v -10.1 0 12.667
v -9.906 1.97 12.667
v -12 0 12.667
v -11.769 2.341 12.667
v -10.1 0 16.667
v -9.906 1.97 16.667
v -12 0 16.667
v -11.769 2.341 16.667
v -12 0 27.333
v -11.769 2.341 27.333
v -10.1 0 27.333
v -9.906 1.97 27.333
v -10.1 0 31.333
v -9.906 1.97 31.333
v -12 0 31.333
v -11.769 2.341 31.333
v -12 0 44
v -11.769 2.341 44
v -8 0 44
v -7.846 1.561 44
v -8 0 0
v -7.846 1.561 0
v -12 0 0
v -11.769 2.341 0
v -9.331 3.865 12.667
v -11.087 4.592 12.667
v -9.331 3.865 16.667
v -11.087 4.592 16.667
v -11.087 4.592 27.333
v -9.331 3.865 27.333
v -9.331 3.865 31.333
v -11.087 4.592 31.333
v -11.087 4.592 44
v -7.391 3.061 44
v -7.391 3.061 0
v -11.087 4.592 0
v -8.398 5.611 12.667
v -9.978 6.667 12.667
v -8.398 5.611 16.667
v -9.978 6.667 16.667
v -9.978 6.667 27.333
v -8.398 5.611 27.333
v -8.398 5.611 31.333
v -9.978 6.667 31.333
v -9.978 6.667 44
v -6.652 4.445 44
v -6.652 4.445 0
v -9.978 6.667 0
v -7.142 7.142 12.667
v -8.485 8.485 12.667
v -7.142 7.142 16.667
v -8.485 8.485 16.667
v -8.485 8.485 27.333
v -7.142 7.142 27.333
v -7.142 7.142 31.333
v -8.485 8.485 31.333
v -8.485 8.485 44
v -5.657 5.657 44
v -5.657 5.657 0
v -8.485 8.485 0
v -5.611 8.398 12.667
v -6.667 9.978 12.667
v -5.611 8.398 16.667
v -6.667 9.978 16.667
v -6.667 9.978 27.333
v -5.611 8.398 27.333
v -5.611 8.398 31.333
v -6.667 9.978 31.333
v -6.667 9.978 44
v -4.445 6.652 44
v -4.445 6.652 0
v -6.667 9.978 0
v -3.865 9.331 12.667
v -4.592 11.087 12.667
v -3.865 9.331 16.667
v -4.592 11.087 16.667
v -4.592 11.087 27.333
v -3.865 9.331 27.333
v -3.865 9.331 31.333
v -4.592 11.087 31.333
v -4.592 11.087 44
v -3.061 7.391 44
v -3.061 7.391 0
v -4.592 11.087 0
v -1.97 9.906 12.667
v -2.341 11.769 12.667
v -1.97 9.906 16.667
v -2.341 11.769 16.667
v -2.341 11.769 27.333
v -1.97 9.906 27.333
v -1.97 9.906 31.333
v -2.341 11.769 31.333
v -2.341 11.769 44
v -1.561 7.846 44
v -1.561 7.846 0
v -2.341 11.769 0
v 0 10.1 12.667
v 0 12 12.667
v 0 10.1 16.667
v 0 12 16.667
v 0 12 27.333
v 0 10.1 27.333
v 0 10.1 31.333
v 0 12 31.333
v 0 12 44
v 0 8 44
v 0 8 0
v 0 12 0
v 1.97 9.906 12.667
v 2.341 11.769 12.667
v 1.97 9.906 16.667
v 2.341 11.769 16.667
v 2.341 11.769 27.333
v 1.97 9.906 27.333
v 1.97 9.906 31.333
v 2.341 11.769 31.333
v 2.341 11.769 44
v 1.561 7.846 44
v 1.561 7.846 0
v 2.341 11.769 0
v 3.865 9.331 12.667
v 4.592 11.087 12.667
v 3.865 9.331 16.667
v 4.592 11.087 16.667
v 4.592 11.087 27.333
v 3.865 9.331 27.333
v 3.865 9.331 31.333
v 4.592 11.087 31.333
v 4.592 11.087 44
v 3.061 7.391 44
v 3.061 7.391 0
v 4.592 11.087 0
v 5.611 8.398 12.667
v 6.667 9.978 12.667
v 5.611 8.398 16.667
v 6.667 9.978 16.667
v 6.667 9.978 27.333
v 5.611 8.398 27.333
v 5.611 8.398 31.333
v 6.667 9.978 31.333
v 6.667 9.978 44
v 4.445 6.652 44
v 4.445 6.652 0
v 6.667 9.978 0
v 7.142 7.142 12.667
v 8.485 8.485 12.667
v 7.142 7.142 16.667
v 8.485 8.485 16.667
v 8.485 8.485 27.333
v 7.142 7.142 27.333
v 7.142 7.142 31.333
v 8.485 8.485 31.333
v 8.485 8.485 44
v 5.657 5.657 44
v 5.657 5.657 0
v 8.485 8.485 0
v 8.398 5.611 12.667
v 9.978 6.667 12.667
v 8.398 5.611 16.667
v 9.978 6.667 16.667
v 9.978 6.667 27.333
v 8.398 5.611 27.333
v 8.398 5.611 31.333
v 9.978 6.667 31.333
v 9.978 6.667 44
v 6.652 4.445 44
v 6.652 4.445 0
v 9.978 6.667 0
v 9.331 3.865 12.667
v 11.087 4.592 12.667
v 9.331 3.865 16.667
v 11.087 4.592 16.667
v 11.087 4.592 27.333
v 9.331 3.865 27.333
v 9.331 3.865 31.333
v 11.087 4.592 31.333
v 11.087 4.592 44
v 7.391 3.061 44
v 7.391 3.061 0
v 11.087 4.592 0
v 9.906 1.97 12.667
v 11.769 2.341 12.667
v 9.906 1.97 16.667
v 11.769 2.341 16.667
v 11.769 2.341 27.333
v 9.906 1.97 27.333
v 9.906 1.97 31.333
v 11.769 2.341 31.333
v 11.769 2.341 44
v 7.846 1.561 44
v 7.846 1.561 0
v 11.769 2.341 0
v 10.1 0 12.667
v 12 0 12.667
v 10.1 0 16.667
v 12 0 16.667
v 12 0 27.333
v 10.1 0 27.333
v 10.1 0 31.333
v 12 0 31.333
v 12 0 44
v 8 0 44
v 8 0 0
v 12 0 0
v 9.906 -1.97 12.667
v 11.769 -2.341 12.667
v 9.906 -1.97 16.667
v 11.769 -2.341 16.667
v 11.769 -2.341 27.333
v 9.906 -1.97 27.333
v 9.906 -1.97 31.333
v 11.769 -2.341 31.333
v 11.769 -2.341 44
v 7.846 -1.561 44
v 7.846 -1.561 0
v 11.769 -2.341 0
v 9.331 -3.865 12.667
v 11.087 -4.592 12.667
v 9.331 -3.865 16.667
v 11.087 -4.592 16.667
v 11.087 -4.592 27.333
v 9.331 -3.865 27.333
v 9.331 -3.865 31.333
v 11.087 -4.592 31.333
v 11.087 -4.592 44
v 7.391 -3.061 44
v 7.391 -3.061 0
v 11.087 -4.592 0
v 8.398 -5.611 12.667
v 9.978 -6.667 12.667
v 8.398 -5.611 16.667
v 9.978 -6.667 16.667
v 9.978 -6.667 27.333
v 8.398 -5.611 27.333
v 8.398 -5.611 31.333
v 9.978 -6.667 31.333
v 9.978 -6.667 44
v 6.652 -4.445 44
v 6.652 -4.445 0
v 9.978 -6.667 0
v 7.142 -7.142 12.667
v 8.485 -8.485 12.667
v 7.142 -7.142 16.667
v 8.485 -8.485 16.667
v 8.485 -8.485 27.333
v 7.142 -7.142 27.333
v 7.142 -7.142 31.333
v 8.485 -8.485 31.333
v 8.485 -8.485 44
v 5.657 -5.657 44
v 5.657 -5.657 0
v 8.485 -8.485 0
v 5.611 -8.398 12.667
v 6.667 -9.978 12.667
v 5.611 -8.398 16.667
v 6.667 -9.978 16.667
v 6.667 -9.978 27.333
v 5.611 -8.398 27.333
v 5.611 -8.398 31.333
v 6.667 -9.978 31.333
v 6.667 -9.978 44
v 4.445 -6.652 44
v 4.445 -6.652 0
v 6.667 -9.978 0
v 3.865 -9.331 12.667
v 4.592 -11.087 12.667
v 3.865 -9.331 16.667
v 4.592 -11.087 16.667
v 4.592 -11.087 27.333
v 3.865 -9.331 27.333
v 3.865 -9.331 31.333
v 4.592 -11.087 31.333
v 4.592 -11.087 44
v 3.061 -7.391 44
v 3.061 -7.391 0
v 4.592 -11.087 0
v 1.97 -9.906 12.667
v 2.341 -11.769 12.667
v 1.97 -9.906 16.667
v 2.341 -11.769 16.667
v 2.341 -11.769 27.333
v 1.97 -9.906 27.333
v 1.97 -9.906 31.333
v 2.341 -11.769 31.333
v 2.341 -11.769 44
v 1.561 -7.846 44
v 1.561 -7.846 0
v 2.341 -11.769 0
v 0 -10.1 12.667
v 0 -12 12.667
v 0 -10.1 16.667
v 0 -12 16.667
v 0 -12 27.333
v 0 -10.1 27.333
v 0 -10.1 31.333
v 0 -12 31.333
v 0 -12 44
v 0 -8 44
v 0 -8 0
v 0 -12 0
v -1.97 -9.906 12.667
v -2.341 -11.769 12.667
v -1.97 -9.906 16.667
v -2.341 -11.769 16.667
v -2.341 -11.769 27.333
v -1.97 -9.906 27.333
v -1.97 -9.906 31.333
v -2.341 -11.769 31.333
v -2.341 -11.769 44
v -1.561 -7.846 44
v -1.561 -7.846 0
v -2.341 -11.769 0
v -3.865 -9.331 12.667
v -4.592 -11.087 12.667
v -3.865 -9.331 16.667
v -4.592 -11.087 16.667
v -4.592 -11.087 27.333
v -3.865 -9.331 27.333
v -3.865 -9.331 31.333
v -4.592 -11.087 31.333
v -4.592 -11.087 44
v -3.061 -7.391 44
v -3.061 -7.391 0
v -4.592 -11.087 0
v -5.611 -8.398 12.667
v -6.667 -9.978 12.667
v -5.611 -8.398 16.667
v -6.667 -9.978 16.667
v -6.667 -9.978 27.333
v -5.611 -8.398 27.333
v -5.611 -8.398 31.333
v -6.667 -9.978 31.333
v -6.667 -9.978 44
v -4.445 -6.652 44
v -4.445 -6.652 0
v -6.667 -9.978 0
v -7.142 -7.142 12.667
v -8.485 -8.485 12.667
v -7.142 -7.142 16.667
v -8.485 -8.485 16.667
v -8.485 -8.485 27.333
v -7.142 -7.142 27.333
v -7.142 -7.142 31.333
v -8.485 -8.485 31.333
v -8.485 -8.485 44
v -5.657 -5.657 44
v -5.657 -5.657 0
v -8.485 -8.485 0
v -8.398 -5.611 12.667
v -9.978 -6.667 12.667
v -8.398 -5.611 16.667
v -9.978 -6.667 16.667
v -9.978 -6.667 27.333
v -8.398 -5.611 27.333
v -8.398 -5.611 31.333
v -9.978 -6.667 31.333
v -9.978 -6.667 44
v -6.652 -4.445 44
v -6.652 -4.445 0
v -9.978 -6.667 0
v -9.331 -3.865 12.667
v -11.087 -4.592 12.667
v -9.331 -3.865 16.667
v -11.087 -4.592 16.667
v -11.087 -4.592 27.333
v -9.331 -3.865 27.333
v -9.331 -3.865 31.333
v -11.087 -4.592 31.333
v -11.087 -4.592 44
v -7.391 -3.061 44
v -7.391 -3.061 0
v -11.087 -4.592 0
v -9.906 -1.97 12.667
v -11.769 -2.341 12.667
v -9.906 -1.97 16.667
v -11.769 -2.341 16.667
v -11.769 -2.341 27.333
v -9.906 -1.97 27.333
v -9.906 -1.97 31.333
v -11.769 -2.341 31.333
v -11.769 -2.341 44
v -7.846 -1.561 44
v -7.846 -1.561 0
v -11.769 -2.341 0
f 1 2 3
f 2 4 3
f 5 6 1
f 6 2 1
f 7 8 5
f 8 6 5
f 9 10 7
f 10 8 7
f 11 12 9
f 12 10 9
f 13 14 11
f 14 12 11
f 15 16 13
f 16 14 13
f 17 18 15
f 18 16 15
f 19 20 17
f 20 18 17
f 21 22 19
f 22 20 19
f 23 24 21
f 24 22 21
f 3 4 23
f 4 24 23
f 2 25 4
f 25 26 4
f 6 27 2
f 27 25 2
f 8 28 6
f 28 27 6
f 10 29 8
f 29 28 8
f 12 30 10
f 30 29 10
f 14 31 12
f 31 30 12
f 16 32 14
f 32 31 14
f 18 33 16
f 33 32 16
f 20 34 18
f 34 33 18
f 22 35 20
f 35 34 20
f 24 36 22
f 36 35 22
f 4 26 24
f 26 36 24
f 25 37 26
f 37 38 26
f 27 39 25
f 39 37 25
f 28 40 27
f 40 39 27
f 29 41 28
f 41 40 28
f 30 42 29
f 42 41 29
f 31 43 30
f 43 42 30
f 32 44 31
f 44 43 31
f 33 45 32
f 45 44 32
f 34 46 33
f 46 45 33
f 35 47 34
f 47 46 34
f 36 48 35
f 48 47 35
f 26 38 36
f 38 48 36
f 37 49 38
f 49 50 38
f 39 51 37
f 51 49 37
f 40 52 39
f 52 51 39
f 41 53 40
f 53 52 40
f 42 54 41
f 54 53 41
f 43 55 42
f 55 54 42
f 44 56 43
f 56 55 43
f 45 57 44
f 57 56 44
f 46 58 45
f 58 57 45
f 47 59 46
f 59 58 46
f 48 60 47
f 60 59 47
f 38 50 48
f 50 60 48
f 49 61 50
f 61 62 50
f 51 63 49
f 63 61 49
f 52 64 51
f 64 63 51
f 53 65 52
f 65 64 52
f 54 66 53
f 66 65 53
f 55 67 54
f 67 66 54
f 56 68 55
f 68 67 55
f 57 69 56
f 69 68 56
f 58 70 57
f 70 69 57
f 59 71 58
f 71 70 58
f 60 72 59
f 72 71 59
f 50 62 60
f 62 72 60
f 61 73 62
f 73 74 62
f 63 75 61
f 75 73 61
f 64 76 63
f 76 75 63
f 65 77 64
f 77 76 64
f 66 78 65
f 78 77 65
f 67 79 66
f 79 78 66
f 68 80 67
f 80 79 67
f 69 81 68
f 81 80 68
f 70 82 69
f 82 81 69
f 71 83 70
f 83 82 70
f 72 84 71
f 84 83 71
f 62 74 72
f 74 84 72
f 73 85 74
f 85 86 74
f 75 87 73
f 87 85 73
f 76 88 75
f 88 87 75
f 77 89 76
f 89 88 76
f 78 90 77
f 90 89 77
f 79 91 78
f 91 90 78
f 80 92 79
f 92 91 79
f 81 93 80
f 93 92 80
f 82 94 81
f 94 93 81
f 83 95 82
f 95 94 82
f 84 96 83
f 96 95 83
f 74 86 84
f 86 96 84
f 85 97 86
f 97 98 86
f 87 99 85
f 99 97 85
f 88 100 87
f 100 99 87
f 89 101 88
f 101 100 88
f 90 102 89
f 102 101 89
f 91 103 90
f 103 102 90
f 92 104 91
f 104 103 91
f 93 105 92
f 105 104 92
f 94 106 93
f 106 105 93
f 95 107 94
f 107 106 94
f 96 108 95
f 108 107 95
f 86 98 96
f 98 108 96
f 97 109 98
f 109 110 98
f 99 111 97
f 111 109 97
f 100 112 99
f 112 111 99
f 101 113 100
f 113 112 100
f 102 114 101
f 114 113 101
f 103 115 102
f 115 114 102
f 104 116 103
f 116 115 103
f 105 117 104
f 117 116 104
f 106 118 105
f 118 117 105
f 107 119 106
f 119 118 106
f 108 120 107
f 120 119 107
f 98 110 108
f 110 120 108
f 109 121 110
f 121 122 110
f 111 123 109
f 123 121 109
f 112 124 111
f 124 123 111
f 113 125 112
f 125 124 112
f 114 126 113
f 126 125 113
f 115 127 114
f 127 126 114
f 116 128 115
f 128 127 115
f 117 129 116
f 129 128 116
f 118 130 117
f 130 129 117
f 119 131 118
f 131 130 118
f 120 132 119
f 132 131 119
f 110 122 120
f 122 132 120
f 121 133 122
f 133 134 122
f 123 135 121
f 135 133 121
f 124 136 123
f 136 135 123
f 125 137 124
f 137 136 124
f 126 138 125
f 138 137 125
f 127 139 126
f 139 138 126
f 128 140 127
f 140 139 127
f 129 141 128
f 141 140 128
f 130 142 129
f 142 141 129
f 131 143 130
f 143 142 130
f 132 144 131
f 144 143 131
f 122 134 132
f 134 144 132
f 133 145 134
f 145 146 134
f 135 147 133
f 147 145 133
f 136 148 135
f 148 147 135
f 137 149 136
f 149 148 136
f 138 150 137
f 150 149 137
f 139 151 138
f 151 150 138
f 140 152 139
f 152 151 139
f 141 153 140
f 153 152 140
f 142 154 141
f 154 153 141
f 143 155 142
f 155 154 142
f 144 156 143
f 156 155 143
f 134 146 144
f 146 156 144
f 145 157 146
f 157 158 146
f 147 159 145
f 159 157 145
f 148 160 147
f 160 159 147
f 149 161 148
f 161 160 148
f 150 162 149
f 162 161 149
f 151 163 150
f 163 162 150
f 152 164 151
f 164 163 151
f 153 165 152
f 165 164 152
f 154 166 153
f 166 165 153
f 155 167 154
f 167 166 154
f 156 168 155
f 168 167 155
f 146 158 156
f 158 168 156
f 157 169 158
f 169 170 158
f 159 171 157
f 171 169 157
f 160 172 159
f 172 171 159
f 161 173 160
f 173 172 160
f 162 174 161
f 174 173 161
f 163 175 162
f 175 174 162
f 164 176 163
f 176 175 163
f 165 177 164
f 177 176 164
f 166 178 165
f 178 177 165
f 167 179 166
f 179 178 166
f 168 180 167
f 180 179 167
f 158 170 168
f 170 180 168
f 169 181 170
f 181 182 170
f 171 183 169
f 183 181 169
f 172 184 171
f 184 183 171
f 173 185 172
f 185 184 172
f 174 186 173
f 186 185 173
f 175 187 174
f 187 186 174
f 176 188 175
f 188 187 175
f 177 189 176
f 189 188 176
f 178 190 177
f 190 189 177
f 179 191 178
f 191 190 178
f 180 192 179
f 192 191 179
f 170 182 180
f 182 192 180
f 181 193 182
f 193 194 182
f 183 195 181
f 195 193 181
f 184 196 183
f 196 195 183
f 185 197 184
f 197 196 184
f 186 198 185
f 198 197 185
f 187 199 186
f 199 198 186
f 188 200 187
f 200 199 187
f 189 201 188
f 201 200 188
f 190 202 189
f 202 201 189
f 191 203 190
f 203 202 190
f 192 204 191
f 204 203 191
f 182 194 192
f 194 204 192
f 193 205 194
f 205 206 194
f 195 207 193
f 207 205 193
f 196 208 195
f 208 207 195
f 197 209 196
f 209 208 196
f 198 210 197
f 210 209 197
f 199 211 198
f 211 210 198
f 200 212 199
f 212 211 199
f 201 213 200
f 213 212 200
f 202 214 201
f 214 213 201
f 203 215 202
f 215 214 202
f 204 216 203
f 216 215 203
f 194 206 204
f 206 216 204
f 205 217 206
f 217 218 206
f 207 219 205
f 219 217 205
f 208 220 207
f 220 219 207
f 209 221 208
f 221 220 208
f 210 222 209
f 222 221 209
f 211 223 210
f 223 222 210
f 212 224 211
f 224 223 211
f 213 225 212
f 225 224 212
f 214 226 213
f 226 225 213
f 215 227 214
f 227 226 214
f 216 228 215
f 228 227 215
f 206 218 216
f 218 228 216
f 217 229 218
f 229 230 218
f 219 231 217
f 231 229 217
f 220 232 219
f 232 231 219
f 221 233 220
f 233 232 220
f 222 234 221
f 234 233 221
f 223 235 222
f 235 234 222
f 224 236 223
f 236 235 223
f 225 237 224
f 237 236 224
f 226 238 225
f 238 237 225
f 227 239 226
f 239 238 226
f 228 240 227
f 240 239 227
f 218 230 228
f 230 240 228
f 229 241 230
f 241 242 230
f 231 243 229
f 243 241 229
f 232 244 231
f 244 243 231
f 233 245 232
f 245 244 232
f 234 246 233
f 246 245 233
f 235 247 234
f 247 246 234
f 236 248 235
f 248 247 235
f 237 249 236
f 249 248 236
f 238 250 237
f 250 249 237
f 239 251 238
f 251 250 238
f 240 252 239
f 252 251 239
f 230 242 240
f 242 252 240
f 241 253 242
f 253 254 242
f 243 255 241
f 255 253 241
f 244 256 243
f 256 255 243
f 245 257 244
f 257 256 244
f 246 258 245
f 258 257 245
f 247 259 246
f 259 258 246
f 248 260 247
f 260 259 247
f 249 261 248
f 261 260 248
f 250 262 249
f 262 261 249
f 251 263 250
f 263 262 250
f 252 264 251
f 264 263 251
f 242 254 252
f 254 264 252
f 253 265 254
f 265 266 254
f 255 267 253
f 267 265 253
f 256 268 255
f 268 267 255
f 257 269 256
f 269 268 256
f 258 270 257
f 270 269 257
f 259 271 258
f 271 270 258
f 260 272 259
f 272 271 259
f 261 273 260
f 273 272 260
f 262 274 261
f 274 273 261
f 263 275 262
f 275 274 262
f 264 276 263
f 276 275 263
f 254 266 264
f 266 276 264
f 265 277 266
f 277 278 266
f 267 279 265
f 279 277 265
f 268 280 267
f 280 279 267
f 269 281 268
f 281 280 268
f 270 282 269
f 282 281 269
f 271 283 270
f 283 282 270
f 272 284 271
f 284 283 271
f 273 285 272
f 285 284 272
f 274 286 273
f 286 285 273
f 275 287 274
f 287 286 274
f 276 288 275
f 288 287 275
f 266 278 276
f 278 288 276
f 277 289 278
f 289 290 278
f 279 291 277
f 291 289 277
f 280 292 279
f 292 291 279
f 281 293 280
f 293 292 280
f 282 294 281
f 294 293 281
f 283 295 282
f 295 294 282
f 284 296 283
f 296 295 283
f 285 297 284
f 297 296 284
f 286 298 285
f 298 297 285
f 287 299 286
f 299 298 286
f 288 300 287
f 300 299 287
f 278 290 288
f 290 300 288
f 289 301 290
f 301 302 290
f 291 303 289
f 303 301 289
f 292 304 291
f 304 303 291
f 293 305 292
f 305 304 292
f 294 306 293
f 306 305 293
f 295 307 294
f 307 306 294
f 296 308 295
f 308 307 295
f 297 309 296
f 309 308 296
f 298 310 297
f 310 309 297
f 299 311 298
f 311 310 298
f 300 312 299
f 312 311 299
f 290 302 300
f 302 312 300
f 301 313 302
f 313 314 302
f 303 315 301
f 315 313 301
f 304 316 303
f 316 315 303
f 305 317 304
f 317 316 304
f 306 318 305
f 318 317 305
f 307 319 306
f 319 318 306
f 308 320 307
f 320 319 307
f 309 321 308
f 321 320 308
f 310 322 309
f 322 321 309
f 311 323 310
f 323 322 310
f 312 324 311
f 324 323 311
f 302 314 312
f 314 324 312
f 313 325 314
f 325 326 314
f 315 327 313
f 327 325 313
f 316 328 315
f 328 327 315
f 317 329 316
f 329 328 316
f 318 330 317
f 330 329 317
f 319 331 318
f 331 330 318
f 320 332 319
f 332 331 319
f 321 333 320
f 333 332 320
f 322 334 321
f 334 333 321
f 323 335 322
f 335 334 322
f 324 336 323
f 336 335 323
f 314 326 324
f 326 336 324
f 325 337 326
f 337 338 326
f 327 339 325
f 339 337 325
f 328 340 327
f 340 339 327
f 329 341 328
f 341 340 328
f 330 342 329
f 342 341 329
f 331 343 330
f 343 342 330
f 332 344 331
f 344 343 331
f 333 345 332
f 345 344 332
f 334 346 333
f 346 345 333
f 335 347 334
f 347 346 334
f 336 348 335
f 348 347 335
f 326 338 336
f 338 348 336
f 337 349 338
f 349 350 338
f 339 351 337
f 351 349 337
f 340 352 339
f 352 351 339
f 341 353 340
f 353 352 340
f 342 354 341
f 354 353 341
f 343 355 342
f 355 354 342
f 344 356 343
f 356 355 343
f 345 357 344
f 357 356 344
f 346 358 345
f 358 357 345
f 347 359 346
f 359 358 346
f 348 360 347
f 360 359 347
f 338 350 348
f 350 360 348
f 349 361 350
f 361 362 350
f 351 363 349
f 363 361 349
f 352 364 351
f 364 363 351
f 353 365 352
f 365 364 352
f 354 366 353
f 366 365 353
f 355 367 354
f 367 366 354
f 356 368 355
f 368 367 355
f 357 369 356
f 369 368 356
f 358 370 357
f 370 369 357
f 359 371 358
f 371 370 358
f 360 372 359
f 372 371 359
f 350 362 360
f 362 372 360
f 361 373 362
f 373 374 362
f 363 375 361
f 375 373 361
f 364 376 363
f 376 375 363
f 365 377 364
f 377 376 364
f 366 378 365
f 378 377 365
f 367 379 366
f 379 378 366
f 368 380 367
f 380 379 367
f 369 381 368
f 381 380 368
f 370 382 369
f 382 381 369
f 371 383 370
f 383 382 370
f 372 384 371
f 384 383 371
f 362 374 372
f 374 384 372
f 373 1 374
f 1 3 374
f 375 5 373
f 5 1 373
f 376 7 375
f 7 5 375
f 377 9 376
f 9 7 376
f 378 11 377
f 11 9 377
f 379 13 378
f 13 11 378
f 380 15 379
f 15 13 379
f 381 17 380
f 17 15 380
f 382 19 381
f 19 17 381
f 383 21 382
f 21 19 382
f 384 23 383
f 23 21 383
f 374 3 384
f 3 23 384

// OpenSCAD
$fn = 32;

// ----------------------------------------------------------------------
// Grooved revolve: plain_grooves, bore R8
// ----------------------------------------------------------------------

// --- parameters (mm) ---
bore_r = 8;               // bore radius
outer_r = 12;             // outer radius of the body
total_h = 44;             // overall height, Z
wall = 4;                 // radial wall thickness
groove_w = 4;             // groove width
groove_d = 1.9;           // groove depth
grooves = 2;              // number of outer grooves

bbox_x = 2 * outer_r;  // full diameter
bore_d = 2 * bore_r;  // bore diameter
body_d = 2 * outer_r;  // body diameter
revolve_angle = 360;  // full turn around the Z axis

profile = [[8, 0], [12, 0], [12, 12.667], [10.1, 12.667], [10.1, 16.667], [12, 16.667], [12, 27.333], [10.1, 27.333], [10.1, 31.333], [12, 31.333], [12, 44], [8, 44]];  // primary outline, 12 points, counter clockwise

// --- the one profile operation ---
rotate_extrude(angle = revolve_angle) polygon(points = profile);
